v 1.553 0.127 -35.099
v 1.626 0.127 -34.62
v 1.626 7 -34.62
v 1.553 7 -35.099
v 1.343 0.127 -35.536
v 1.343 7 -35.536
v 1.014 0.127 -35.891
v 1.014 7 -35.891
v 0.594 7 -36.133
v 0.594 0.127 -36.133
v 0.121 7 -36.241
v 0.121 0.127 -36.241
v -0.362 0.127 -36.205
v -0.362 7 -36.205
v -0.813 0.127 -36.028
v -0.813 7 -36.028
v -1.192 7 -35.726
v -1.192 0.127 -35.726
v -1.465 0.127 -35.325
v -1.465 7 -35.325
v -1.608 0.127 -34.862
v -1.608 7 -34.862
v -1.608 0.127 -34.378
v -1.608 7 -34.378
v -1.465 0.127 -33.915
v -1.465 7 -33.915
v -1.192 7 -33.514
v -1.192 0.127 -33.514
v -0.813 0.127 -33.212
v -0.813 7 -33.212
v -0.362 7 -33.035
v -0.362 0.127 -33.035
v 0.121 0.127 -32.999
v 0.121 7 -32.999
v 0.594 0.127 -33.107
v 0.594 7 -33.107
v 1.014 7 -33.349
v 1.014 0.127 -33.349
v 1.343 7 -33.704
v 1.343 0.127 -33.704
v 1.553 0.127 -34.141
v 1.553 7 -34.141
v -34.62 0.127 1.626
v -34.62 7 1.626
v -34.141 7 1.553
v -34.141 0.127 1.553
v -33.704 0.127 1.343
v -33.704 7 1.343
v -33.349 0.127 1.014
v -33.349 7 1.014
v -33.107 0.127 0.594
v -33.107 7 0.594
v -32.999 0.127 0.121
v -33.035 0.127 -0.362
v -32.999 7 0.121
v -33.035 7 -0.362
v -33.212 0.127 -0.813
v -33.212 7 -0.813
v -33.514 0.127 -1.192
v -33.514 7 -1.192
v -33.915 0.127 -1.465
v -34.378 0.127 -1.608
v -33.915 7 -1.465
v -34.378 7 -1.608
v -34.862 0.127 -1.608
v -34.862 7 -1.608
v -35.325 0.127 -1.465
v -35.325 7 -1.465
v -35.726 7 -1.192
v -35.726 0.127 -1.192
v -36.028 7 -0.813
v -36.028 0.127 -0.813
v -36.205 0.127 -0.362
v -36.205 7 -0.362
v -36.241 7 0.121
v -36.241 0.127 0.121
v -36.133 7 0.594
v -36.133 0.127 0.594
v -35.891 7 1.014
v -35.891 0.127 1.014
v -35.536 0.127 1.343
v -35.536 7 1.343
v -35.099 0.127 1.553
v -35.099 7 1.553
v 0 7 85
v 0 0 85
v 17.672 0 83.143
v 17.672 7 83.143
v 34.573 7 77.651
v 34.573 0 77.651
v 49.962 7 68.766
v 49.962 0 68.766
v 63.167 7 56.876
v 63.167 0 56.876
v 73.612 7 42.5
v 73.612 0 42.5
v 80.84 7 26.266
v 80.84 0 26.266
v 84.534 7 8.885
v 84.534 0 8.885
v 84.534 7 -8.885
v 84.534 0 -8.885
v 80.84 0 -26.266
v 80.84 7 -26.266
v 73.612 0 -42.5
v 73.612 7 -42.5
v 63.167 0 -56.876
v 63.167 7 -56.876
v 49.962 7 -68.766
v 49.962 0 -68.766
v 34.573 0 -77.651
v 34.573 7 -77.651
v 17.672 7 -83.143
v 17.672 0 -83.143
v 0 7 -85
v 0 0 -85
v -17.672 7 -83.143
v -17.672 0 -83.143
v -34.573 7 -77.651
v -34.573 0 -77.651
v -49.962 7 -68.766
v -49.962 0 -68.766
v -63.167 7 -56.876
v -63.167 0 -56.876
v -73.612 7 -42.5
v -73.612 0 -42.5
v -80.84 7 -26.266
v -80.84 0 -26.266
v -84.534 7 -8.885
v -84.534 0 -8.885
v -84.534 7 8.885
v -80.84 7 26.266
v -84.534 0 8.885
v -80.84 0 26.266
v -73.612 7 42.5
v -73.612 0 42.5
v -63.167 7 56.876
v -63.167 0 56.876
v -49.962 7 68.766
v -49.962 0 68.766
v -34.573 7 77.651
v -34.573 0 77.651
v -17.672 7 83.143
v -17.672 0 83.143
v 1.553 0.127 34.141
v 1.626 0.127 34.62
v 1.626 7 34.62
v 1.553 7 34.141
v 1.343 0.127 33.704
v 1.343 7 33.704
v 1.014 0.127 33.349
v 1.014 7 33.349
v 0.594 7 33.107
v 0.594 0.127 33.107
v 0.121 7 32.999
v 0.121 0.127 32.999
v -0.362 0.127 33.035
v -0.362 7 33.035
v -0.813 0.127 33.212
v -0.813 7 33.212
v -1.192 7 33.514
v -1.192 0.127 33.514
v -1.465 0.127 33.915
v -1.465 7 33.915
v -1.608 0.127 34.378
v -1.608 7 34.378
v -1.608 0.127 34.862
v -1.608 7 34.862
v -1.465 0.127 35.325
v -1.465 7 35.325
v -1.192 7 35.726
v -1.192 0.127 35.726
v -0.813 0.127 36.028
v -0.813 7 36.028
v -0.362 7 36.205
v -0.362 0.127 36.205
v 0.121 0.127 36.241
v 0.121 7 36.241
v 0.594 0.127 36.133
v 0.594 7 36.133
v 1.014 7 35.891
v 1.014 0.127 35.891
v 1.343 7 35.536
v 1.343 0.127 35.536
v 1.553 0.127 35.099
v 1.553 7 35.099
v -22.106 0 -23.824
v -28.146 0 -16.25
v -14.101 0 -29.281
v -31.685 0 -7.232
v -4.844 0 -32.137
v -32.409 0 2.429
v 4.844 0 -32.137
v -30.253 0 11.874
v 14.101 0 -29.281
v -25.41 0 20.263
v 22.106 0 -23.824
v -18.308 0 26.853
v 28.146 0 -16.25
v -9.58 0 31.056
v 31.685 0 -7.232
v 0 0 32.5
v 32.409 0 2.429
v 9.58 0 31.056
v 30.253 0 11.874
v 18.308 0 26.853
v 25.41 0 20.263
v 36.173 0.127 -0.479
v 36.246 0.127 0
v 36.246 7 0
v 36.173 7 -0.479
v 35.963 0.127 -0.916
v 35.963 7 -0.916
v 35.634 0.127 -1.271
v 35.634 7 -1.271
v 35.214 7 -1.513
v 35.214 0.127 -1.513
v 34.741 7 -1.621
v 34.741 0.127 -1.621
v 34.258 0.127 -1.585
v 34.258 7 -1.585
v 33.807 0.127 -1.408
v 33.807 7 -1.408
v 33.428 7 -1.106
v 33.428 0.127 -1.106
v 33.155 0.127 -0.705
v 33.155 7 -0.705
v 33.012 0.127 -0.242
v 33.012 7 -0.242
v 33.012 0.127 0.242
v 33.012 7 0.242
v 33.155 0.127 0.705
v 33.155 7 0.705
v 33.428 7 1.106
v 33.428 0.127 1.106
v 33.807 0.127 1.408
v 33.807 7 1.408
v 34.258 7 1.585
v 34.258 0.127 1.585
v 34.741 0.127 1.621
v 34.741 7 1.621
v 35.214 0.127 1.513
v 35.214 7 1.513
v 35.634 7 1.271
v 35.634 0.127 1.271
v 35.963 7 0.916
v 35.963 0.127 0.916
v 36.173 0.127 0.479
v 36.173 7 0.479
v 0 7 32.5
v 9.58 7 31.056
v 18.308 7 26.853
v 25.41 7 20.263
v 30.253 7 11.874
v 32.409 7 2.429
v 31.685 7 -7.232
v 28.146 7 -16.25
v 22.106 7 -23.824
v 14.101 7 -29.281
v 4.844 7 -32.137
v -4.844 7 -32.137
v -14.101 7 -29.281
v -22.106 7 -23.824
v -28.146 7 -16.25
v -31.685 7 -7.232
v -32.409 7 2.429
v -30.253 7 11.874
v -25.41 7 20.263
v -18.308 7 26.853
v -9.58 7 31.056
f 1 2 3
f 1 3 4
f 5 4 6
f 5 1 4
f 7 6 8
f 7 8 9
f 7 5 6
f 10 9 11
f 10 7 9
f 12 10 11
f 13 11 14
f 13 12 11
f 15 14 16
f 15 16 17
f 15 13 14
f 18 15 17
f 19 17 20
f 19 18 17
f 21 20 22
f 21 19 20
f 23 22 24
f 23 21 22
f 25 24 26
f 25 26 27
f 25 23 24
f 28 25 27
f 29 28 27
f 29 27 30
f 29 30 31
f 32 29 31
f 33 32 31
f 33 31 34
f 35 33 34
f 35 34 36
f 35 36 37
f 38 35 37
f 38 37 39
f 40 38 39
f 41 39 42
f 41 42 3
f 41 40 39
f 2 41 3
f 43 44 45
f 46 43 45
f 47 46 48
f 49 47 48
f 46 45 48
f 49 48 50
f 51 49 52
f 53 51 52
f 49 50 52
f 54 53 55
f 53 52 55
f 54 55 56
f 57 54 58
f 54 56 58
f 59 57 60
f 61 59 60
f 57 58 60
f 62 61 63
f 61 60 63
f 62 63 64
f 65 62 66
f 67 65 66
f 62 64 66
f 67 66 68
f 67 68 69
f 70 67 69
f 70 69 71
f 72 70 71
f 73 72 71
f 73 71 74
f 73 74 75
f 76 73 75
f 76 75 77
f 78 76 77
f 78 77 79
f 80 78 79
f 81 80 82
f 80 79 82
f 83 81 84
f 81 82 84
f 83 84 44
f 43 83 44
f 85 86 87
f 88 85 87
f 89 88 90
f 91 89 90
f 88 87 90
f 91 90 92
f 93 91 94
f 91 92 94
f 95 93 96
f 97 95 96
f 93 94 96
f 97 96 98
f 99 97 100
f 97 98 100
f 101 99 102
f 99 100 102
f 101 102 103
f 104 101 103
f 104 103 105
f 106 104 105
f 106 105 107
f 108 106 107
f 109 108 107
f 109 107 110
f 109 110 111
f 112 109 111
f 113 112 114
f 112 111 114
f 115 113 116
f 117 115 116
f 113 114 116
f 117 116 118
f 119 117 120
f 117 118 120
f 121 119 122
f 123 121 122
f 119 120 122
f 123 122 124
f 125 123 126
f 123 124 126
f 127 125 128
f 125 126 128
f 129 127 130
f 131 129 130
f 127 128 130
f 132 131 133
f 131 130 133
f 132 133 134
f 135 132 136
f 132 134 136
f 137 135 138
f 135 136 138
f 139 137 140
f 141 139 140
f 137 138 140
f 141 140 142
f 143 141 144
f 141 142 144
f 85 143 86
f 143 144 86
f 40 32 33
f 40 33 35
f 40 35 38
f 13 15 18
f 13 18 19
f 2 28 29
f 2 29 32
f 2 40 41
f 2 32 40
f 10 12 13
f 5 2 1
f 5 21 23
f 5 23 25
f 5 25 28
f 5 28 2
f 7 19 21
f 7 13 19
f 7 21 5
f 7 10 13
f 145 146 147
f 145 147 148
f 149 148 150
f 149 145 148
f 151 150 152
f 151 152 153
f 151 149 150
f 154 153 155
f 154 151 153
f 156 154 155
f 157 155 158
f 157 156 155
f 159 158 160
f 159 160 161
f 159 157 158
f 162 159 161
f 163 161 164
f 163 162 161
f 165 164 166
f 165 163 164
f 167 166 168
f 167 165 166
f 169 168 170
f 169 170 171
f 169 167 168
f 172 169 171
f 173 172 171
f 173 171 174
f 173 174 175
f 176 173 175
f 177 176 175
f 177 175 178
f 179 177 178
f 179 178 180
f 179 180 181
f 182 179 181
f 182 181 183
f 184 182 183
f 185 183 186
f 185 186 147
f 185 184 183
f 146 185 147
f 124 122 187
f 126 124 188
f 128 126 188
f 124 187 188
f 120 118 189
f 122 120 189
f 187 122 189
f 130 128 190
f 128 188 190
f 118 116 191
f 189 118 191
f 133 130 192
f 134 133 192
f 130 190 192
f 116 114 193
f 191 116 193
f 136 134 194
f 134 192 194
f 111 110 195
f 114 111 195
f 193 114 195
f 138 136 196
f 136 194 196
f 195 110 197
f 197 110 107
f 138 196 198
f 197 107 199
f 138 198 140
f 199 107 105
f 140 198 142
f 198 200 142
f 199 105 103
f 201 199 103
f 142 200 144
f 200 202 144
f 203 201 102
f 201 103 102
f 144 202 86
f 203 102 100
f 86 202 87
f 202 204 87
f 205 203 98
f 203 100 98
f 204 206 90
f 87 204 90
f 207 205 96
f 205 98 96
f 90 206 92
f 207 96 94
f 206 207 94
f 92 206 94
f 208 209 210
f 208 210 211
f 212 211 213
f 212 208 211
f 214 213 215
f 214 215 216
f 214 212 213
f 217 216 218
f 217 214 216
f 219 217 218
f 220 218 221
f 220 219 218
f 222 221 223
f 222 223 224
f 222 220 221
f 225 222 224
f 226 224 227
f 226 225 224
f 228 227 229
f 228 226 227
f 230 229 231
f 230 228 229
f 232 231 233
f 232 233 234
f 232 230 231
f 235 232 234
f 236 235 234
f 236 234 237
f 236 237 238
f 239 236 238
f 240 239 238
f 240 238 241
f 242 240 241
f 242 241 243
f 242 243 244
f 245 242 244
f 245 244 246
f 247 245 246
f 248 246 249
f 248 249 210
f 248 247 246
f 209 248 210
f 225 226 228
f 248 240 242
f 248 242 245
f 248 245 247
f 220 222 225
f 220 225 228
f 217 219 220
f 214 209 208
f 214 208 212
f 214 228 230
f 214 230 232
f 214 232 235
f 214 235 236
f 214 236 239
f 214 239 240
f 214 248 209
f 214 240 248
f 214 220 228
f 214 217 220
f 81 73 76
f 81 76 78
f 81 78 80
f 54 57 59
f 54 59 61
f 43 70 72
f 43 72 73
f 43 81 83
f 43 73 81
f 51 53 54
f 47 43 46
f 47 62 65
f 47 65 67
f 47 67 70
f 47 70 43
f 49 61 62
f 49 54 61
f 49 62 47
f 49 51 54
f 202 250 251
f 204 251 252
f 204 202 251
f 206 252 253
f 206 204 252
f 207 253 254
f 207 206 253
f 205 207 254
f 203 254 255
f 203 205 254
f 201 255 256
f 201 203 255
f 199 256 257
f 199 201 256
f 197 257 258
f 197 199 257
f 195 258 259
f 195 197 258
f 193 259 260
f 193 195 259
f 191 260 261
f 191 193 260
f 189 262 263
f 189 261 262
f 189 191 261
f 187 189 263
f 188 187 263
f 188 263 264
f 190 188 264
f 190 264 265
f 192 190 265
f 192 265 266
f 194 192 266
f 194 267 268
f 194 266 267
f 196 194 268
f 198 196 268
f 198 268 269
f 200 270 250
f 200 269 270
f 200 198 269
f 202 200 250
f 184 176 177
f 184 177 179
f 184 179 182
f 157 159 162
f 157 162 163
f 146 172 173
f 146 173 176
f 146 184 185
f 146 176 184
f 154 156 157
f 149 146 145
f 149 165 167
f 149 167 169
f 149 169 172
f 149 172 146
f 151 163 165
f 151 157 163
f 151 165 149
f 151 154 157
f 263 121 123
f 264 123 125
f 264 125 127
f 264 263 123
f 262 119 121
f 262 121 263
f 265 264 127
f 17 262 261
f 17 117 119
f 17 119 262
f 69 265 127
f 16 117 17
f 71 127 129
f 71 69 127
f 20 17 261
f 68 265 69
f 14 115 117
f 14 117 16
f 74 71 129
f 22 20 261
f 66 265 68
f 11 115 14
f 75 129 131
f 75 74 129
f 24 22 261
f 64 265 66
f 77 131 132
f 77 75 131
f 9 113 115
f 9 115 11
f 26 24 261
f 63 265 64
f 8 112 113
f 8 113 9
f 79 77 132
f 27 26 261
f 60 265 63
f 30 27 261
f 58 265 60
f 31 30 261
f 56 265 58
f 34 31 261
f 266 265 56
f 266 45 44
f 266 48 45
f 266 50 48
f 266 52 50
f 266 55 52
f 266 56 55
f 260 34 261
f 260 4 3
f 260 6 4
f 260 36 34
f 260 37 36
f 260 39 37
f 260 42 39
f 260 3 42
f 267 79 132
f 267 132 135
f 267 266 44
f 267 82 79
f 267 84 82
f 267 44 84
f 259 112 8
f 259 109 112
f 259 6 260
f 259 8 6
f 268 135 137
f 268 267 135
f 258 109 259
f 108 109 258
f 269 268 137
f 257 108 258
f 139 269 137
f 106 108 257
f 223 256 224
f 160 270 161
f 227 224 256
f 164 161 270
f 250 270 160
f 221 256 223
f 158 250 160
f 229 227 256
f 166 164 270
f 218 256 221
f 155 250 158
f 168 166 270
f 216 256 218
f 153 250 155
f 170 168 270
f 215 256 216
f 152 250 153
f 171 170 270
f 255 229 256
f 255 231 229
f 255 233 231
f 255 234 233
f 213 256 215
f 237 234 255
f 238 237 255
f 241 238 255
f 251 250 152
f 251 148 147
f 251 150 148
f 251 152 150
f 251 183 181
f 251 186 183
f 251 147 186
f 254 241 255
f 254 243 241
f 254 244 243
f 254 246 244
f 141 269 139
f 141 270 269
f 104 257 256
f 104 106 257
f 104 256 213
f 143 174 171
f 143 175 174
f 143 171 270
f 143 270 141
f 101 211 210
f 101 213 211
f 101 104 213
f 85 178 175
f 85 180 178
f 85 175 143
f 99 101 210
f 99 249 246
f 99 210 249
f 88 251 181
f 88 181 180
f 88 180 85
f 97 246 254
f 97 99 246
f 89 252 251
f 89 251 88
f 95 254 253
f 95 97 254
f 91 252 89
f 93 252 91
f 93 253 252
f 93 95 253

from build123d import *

# Parameters (mm, degrees)
SKETCH1_R           = 85
BOSS_EXTRUDE1_DEPTH = 7
SKETCH2_R           = 32.5
CUT_EXTRUDE1_DEPTH  = 121.411793442
SKETCH3_R           = 1.625700543
CUT_EXTRUDE2_DEPTH  = 6.872683155
CIRPATTERN1_COUNT   = 4


with BuildPart() as part:
    # Sketch1 → Boss-Extrude1 (new body)
    with BuildSketch(Plane(origin=(0, 0, 0), x_dir=(1, 0, 0), z_dir=(0, 1, 0))):
        Circle(SKETCH1_R)
    extrude(amount=BOSS_EXTRUDE1_DEPTH)

    # Sketch2 → Cut-Extrude1 (cut, through all)
    with BuildSketch(Plane(origin=(0, 0, 0), x_dir=(1, 0, 0), z_dir=(0, 1, 0))):
        Circle(SKETCH2_R)
    extrude(amount=CUT_EXTRUDE1_DEPTH, mode=Mode.SUBTRACT)

    # Sketch3 → Cut-Extrude2 (cut)
    with BuildSketch(Plane(origin=(0, 7, 0), x_dir=(1, 0, 0), z_dir=(0, 1, 0))):
        with Locations((-34.619906271, 0)):
            Circle(SKETCH3_R)
    cut_extrude2 = extrude(amount=-CUT_EXTRUDE2_DEPTH, mode=Mode.SUBTRACT)

    # CirPattern1: Cut-Extrude2 ×4 about axis
    cirpattern1_axis = Axis((0, 0, 0), (0, 1, 0))
    for i in range(1, CIRPATTERN1_COUNT):
        add(cut_extrude2.rotate(cirpattern1_axis, i * 360 / CIRPATTERN1_COUNT), mode=Mode.SUBTRACT)


solid = part.part
